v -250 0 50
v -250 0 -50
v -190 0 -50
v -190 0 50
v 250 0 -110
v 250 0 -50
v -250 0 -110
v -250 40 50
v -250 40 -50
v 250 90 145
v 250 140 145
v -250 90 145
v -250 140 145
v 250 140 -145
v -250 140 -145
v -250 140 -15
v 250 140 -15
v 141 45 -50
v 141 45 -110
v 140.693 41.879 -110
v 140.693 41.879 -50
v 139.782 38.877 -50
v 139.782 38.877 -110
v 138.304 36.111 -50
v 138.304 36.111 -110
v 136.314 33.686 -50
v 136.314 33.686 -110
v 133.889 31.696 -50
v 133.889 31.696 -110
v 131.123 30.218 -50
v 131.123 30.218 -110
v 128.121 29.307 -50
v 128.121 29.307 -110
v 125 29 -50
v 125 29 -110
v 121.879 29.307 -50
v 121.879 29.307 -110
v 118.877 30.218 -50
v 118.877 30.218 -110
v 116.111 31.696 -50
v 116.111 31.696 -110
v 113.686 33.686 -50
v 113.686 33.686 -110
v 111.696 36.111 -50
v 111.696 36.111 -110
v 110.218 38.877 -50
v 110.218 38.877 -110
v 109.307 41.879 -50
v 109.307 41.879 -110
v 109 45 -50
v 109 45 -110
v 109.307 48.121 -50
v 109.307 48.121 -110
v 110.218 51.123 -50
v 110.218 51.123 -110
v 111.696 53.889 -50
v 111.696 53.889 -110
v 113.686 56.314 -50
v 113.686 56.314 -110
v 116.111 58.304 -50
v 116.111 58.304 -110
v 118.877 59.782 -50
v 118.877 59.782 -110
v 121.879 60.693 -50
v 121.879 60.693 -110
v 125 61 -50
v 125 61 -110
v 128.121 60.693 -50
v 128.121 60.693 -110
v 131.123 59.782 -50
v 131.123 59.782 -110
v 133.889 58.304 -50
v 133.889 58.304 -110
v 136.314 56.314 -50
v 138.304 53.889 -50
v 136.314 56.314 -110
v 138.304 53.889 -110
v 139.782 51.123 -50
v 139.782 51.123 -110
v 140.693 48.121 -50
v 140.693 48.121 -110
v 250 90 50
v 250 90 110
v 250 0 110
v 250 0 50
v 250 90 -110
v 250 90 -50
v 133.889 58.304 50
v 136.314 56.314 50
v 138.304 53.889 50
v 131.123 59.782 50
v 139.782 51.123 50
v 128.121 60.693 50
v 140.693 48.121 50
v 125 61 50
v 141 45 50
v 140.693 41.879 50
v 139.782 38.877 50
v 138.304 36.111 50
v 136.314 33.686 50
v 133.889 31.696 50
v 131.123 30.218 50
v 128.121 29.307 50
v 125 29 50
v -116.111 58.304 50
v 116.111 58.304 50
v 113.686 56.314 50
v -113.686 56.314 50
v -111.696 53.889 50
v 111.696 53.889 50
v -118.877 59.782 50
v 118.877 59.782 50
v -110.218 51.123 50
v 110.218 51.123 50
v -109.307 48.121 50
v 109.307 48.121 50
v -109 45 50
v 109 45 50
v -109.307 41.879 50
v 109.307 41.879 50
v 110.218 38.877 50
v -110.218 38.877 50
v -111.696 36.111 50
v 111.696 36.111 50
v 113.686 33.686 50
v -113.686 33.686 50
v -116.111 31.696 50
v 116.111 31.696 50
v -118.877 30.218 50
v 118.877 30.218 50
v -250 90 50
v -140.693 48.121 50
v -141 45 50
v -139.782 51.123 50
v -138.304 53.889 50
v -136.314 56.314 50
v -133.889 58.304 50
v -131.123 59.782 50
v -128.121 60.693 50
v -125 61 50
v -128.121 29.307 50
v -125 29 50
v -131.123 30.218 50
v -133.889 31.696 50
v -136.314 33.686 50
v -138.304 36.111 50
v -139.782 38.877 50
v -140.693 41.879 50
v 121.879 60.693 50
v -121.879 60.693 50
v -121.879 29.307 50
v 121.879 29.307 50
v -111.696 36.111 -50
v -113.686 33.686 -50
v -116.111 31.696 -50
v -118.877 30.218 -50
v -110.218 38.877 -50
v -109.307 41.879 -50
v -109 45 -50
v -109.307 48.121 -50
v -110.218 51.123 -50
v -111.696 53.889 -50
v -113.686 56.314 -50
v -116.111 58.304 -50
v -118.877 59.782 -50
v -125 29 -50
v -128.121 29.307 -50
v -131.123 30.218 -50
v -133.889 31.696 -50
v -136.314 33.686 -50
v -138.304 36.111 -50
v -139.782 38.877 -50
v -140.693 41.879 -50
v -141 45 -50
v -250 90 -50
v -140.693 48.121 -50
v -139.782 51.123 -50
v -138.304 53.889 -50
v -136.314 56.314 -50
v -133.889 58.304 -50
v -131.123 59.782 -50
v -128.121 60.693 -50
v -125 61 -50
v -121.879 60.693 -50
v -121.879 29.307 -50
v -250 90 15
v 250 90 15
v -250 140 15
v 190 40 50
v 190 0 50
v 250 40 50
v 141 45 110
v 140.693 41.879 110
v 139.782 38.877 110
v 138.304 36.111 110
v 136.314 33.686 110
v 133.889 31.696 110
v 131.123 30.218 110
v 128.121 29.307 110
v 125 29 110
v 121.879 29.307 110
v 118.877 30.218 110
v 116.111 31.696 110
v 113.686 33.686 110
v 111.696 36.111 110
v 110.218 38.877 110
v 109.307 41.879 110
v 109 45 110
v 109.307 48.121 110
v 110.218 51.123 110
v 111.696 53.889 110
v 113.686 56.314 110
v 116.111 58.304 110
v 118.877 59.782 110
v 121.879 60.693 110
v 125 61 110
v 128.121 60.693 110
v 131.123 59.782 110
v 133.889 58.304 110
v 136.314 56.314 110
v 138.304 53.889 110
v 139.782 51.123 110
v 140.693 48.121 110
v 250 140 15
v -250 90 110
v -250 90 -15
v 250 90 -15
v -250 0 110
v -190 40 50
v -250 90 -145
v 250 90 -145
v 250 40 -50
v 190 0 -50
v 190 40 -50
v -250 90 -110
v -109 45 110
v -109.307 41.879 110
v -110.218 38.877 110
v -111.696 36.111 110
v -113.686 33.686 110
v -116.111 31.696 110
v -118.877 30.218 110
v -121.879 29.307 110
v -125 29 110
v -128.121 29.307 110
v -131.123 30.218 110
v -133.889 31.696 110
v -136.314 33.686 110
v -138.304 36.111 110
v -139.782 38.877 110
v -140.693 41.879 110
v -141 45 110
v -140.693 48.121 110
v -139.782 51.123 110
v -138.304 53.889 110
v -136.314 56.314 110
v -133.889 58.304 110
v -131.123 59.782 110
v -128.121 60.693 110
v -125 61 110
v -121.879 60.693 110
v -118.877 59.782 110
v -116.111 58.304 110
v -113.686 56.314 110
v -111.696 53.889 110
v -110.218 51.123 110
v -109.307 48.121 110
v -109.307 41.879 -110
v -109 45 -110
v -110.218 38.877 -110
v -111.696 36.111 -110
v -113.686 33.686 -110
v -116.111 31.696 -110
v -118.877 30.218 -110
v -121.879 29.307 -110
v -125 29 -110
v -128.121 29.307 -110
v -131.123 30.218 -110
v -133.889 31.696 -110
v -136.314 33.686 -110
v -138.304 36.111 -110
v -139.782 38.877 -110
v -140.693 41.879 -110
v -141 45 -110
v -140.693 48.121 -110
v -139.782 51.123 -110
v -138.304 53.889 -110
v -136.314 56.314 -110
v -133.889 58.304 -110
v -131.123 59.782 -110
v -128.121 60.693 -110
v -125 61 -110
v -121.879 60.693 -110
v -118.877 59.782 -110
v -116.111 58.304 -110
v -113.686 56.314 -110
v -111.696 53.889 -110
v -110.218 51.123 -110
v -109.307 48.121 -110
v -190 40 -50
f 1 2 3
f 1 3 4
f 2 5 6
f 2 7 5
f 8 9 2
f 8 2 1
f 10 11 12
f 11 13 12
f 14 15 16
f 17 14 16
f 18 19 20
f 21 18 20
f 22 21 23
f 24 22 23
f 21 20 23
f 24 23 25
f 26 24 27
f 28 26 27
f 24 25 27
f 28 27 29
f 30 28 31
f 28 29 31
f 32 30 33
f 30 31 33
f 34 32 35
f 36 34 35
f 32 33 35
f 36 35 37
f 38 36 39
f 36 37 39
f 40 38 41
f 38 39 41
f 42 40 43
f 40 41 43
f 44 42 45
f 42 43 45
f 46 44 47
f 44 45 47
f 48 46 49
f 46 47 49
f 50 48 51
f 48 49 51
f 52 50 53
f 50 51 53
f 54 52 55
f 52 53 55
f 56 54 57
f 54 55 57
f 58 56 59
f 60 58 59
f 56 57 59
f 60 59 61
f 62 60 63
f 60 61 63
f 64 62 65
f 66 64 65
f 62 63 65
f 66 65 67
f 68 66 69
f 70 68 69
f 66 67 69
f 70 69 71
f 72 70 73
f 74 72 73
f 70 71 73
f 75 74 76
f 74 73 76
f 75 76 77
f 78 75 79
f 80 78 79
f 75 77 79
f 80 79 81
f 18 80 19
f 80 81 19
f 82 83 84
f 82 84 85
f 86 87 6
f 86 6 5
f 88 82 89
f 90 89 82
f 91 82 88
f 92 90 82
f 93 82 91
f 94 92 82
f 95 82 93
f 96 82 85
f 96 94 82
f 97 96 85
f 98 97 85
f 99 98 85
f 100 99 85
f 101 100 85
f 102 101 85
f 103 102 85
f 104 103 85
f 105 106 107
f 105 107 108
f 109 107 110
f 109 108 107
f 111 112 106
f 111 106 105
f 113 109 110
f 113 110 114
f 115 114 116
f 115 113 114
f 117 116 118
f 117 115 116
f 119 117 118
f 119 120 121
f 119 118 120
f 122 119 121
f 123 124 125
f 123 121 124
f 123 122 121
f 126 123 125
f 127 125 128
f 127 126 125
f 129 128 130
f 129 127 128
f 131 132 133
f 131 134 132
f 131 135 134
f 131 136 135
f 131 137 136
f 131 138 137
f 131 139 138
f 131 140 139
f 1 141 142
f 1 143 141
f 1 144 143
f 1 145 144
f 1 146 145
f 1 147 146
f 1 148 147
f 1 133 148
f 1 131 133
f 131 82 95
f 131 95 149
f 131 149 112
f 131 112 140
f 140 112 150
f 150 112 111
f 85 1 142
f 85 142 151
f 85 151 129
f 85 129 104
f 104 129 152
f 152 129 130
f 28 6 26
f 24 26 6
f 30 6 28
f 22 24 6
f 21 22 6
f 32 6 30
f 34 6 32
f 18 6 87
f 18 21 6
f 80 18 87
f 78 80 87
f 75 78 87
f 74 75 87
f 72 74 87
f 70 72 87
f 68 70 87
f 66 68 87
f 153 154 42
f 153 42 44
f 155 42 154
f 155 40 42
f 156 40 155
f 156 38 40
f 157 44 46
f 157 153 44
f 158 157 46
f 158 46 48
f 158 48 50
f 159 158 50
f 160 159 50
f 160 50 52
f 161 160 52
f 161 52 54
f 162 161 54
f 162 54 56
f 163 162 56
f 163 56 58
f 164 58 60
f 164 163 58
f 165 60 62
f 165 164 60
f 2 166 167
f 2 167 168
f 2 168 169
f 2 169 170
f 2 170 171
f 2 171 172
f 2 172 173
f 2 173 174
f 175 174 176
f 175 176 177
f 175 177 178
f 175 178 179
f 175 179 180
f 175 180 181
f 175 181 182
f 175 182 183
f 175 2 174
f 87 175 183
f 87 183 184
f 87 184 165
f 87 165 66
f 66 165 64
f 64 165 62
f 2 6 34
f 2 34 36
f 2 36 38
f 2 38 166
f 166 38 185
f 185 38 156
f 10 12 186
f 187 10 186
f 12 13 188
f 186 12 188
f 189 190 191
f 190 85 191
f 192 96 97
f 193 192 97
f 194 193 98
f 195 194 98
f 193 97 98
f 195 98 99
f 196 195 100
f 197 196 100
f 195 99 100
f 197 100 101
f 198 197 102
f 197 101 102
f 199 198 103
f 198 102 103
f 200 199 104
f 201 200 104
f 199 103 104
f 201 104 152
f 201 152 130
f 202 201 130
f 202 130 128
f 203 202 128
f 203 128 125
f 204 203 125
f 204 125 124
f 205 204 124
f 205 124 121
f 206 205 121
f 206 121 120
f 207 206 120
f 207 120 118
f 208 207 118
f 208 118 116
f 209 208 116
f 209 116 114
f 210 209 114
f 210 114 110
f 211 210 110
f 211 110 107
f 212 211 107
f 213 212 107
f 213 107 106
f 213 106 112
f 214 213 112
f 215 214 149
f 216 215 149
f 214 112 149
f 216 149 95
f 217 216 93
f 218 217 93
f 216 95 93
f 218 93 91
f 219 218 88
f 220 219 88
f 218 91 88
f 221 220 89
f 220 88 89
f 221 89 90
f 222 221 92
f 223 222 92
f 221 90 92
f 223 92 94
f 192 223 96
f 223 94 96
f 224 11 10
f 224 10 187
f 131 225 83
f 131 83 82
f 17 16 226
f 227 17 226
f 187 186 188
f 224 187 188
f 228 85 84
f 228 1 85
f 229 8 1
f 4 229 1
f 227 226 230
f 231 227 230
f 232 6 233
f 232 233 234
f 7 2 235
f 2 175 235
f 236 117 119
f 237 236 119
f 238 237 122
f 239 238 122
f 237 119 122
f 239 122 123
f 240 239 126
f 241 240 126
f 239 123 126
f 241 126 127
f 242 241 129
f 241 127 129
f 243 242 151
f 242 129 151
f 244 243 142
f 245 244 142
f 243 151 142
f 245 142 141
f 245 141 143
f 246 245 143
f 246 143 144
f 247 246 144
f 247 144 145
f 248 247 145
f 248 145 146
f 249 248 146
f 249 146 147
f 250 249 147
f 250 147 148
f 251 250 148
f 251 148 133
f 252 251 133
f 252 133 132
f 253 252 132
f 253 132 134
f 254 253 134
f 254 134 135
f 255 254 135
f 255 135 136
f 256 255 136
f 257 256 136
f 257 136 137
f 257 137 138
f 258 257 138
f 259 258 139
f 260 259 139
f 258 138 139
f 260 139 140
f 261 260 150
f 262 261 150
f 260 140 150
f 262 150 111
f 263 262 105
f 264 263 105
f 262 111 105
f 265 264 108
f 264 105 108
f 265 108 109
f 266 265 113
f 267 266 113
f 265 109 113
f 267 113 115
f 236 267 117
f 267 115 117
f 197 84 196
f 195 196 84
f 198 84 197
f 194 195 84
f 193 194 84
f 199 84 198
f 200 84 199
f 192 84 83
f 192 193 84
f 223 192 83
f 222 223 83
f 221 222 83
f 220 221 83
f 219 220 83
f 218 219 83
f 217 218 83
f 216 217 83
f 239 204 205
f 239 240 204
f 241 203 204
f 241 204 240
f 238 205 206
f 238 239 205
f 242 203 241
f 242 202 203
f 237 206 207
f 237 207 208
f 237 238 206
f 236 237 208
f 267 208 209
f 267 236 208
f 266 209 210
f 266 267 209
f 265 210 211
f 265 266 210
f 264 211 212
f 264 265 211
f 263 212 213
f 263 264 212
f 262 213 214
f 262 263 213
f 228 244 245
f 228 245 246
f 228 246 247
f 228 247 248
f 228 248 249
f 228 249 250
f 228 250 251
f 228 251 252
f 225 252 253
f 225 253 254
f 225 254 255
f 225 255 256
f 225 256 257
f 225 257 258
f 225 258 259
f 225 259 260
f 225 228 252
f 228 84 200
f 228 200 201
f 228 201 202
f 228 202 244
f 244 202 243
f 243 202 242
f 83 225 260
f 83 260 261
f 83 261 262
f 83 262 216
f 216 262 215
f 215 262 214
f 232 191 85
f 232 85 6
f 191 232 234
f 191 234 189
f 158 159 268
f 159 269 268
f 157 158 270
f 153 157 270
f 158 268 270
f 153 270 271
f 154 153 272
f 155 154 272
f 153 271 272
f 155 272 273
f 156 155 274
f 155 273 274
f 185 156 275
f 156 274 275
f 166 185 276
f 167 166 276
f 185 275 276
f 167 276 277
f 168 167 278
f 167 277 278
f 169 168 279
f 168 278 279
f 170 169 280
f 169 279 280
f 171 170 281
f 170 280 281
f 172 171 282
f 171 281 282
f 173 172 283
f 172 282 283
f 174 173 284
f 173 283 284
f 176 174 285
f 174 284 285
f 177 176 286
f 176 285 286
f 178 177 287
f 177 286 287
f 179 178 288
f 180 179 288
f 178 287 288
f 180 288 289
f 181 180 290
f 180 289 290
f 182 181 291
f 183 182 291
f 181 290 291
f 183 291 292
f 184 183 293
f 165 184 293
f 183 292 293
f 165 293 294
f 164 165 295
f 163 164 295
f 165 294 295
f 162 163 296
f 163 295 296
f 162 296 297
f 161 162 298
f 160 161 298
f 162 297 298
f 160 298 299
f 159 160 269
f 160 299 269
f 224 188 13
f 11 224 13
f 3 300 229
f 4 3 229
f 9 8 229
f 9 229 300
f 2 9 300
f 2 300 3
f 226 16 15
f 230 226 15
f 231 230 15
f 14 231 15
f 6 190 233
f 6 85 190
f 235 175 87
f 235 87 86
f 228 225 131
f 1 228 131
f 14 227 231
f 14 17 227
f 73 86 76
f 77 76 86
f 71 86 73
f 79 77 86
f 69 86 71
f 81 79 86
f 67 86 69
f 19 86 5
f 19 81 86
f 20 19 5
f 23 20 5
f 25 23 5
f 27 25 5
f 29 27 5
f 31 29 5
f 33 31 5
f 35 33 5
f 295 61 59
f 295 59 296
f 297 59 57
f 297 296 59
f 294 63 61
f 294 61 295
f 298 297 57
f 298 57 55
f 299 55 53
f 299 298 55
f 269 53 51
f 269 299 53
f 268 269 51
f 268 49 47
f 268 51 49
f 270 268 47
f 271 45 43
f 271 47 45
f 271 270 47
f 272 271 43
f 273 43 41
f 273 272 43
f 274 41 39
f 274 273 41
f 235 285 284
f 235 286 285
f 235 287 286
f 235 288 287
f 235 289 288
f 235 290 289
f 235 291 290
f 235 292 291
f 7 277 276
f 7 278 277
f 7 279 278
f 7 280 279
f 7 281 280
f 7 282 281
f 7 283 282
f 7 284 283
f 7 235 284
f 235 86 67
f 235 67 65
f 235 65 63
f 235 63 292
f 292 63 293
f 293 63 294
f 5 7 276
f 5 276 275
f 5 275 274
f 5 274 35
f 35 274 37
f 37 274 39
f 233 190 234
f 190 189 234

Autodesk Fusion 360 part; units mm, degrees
sketch "Sketch1" plane through (0, 0, 0) normal (1, 0, 0) x (0, 0, -1) in component "Bottom"
  line L0 (-50, 0) -> (-110, 0)
  line L1 (-110, 0) -> (-110, 90)
  line L2 (-110, 90) -> (-50, 90)
  line L3 (-50, 90) -> (-50, 0)
  dimension "d1" = 60
  dimension "d2" = 90
  dimension "d3" = 50
extrude "Extrude1" add sketch "Sketch1" along normal mid plane 500 makes body 1 in component "Bottom"
mirror "Mirror1" about plane through (0, 0, 0) normal (0, 0, 1) of bodies 1 makes body 2 in component "Bottom"
sketch "Sketch1 (2)" plane through (0, 0, 0) normal (1, 0, 0) x (0, 0, -1) in component "Flat"
  line L0 (-110, 90) -> (-50, 90)
  line L1 (-145, 90) -> (-15, 90)
  line L2 (-15, 90) -> (-15, 140)
  line L3 (-15, 140) -> (-145, 140)
  line L4 (-145, 140) -> (-145, 90)
  dimension "d7" = 130
  dimension "d8" = 50
extrude "Extrude1'" add sketch "Sketch1 (2)" along normal mid plane 500 separate body makes body 3 in component "Flat"
mirror "Mirror1'" about plane through (0, 0, 0) normal (0, 0, 1) of bodies 3 makes body 4 in component "Flat"
sketch "Sketch1 (3)" plane through (250, 0, 0) normal (1, 0, 0) x (0, 0, -1) in component "Spacers"
  line L0 (-50, 90) -> (-110, 90)
  line L1 (-110, 90) -> (-110, 0)
  line L2 (-110, 0) -> (-50, 0)
  line L3 (-50, 0) -> (-50, 90)
  line L4 (-50, 0) -> (-50, 90)
  line L5 (50, 0) -> (50, 90)
  line L6 (-50, 0) -> (50, 0)
  line L7 (50, 0) -> (50, 40)
  line L8 (50, 40) -> (-50, 40)
  line L9 (-50, 40) -> (-50, 0)
extrude "Extrude1''" add sketch "Sketch1 (3)" against normal blind 60 separate body contours L3 L4 L5 L6 L7 L8 L9 makes body 5 in component "Spacers"
mirror "Mirror1''" about plane through (0, 0, 0) normal (1, 0, 0) of bodies 5 makes body 6 in component "Spacers"
sketch "Sketch2" plane through (0, 0, 0) normal (0, 0, 1) x (1, 0, 0) in component "Bottom"
  line L0 (-250, 0) -> (250, 0)
  line L1 (250, 0) -> (250, 90)
  line L2 (250, 90) -> (-250, 90)
  line L3 (-250, 90) -> (-250, 0)
  line L4 (250, 90) -> (0, 0)
  line L5 (250, 0) -> (0, 90)
  line L6 (-250, 90) -> (0, 0)
  line L7 (-250, 0) -> (0, 90)
  circle A0 centre (125, 45) radius 16
  circle A1 centre (-125, 45) radius 16
  dimension "d15" = 32
  dimension "d16" = 32
extrude "Extrude2" cut sketch "Sketch2" along normal through all and the other way through all contours L6 L7 A1 | L6 L7 A1 | L4 L5 A0 | L4 L5 A0 | L6 L7 A1 | L6 L7 A1 | L4 L5 A0 | L4 L5 A0 bodies 1 2 in component "Bottom"
component "Bed" placed x (1, 0, 0) y (0, 1, 0) z (0, 0, 1) at (0, 0, 0)
component "Bottom" placed x (1, 0, 0) y (0, 1, 0) z (0, 0, 1) at (0, 0, 0) in component "Bed"
component "Flat" placed x (1, 0, 0) y (0, 1, 0) z (0, 0, 1) at (0, 0, 0) in component "Bed"
component "Spacers" placed x (1, 0, 0) y (0, 1, 0) z (0, 0, 1) at (0, 0, 0) in component "Bed"
